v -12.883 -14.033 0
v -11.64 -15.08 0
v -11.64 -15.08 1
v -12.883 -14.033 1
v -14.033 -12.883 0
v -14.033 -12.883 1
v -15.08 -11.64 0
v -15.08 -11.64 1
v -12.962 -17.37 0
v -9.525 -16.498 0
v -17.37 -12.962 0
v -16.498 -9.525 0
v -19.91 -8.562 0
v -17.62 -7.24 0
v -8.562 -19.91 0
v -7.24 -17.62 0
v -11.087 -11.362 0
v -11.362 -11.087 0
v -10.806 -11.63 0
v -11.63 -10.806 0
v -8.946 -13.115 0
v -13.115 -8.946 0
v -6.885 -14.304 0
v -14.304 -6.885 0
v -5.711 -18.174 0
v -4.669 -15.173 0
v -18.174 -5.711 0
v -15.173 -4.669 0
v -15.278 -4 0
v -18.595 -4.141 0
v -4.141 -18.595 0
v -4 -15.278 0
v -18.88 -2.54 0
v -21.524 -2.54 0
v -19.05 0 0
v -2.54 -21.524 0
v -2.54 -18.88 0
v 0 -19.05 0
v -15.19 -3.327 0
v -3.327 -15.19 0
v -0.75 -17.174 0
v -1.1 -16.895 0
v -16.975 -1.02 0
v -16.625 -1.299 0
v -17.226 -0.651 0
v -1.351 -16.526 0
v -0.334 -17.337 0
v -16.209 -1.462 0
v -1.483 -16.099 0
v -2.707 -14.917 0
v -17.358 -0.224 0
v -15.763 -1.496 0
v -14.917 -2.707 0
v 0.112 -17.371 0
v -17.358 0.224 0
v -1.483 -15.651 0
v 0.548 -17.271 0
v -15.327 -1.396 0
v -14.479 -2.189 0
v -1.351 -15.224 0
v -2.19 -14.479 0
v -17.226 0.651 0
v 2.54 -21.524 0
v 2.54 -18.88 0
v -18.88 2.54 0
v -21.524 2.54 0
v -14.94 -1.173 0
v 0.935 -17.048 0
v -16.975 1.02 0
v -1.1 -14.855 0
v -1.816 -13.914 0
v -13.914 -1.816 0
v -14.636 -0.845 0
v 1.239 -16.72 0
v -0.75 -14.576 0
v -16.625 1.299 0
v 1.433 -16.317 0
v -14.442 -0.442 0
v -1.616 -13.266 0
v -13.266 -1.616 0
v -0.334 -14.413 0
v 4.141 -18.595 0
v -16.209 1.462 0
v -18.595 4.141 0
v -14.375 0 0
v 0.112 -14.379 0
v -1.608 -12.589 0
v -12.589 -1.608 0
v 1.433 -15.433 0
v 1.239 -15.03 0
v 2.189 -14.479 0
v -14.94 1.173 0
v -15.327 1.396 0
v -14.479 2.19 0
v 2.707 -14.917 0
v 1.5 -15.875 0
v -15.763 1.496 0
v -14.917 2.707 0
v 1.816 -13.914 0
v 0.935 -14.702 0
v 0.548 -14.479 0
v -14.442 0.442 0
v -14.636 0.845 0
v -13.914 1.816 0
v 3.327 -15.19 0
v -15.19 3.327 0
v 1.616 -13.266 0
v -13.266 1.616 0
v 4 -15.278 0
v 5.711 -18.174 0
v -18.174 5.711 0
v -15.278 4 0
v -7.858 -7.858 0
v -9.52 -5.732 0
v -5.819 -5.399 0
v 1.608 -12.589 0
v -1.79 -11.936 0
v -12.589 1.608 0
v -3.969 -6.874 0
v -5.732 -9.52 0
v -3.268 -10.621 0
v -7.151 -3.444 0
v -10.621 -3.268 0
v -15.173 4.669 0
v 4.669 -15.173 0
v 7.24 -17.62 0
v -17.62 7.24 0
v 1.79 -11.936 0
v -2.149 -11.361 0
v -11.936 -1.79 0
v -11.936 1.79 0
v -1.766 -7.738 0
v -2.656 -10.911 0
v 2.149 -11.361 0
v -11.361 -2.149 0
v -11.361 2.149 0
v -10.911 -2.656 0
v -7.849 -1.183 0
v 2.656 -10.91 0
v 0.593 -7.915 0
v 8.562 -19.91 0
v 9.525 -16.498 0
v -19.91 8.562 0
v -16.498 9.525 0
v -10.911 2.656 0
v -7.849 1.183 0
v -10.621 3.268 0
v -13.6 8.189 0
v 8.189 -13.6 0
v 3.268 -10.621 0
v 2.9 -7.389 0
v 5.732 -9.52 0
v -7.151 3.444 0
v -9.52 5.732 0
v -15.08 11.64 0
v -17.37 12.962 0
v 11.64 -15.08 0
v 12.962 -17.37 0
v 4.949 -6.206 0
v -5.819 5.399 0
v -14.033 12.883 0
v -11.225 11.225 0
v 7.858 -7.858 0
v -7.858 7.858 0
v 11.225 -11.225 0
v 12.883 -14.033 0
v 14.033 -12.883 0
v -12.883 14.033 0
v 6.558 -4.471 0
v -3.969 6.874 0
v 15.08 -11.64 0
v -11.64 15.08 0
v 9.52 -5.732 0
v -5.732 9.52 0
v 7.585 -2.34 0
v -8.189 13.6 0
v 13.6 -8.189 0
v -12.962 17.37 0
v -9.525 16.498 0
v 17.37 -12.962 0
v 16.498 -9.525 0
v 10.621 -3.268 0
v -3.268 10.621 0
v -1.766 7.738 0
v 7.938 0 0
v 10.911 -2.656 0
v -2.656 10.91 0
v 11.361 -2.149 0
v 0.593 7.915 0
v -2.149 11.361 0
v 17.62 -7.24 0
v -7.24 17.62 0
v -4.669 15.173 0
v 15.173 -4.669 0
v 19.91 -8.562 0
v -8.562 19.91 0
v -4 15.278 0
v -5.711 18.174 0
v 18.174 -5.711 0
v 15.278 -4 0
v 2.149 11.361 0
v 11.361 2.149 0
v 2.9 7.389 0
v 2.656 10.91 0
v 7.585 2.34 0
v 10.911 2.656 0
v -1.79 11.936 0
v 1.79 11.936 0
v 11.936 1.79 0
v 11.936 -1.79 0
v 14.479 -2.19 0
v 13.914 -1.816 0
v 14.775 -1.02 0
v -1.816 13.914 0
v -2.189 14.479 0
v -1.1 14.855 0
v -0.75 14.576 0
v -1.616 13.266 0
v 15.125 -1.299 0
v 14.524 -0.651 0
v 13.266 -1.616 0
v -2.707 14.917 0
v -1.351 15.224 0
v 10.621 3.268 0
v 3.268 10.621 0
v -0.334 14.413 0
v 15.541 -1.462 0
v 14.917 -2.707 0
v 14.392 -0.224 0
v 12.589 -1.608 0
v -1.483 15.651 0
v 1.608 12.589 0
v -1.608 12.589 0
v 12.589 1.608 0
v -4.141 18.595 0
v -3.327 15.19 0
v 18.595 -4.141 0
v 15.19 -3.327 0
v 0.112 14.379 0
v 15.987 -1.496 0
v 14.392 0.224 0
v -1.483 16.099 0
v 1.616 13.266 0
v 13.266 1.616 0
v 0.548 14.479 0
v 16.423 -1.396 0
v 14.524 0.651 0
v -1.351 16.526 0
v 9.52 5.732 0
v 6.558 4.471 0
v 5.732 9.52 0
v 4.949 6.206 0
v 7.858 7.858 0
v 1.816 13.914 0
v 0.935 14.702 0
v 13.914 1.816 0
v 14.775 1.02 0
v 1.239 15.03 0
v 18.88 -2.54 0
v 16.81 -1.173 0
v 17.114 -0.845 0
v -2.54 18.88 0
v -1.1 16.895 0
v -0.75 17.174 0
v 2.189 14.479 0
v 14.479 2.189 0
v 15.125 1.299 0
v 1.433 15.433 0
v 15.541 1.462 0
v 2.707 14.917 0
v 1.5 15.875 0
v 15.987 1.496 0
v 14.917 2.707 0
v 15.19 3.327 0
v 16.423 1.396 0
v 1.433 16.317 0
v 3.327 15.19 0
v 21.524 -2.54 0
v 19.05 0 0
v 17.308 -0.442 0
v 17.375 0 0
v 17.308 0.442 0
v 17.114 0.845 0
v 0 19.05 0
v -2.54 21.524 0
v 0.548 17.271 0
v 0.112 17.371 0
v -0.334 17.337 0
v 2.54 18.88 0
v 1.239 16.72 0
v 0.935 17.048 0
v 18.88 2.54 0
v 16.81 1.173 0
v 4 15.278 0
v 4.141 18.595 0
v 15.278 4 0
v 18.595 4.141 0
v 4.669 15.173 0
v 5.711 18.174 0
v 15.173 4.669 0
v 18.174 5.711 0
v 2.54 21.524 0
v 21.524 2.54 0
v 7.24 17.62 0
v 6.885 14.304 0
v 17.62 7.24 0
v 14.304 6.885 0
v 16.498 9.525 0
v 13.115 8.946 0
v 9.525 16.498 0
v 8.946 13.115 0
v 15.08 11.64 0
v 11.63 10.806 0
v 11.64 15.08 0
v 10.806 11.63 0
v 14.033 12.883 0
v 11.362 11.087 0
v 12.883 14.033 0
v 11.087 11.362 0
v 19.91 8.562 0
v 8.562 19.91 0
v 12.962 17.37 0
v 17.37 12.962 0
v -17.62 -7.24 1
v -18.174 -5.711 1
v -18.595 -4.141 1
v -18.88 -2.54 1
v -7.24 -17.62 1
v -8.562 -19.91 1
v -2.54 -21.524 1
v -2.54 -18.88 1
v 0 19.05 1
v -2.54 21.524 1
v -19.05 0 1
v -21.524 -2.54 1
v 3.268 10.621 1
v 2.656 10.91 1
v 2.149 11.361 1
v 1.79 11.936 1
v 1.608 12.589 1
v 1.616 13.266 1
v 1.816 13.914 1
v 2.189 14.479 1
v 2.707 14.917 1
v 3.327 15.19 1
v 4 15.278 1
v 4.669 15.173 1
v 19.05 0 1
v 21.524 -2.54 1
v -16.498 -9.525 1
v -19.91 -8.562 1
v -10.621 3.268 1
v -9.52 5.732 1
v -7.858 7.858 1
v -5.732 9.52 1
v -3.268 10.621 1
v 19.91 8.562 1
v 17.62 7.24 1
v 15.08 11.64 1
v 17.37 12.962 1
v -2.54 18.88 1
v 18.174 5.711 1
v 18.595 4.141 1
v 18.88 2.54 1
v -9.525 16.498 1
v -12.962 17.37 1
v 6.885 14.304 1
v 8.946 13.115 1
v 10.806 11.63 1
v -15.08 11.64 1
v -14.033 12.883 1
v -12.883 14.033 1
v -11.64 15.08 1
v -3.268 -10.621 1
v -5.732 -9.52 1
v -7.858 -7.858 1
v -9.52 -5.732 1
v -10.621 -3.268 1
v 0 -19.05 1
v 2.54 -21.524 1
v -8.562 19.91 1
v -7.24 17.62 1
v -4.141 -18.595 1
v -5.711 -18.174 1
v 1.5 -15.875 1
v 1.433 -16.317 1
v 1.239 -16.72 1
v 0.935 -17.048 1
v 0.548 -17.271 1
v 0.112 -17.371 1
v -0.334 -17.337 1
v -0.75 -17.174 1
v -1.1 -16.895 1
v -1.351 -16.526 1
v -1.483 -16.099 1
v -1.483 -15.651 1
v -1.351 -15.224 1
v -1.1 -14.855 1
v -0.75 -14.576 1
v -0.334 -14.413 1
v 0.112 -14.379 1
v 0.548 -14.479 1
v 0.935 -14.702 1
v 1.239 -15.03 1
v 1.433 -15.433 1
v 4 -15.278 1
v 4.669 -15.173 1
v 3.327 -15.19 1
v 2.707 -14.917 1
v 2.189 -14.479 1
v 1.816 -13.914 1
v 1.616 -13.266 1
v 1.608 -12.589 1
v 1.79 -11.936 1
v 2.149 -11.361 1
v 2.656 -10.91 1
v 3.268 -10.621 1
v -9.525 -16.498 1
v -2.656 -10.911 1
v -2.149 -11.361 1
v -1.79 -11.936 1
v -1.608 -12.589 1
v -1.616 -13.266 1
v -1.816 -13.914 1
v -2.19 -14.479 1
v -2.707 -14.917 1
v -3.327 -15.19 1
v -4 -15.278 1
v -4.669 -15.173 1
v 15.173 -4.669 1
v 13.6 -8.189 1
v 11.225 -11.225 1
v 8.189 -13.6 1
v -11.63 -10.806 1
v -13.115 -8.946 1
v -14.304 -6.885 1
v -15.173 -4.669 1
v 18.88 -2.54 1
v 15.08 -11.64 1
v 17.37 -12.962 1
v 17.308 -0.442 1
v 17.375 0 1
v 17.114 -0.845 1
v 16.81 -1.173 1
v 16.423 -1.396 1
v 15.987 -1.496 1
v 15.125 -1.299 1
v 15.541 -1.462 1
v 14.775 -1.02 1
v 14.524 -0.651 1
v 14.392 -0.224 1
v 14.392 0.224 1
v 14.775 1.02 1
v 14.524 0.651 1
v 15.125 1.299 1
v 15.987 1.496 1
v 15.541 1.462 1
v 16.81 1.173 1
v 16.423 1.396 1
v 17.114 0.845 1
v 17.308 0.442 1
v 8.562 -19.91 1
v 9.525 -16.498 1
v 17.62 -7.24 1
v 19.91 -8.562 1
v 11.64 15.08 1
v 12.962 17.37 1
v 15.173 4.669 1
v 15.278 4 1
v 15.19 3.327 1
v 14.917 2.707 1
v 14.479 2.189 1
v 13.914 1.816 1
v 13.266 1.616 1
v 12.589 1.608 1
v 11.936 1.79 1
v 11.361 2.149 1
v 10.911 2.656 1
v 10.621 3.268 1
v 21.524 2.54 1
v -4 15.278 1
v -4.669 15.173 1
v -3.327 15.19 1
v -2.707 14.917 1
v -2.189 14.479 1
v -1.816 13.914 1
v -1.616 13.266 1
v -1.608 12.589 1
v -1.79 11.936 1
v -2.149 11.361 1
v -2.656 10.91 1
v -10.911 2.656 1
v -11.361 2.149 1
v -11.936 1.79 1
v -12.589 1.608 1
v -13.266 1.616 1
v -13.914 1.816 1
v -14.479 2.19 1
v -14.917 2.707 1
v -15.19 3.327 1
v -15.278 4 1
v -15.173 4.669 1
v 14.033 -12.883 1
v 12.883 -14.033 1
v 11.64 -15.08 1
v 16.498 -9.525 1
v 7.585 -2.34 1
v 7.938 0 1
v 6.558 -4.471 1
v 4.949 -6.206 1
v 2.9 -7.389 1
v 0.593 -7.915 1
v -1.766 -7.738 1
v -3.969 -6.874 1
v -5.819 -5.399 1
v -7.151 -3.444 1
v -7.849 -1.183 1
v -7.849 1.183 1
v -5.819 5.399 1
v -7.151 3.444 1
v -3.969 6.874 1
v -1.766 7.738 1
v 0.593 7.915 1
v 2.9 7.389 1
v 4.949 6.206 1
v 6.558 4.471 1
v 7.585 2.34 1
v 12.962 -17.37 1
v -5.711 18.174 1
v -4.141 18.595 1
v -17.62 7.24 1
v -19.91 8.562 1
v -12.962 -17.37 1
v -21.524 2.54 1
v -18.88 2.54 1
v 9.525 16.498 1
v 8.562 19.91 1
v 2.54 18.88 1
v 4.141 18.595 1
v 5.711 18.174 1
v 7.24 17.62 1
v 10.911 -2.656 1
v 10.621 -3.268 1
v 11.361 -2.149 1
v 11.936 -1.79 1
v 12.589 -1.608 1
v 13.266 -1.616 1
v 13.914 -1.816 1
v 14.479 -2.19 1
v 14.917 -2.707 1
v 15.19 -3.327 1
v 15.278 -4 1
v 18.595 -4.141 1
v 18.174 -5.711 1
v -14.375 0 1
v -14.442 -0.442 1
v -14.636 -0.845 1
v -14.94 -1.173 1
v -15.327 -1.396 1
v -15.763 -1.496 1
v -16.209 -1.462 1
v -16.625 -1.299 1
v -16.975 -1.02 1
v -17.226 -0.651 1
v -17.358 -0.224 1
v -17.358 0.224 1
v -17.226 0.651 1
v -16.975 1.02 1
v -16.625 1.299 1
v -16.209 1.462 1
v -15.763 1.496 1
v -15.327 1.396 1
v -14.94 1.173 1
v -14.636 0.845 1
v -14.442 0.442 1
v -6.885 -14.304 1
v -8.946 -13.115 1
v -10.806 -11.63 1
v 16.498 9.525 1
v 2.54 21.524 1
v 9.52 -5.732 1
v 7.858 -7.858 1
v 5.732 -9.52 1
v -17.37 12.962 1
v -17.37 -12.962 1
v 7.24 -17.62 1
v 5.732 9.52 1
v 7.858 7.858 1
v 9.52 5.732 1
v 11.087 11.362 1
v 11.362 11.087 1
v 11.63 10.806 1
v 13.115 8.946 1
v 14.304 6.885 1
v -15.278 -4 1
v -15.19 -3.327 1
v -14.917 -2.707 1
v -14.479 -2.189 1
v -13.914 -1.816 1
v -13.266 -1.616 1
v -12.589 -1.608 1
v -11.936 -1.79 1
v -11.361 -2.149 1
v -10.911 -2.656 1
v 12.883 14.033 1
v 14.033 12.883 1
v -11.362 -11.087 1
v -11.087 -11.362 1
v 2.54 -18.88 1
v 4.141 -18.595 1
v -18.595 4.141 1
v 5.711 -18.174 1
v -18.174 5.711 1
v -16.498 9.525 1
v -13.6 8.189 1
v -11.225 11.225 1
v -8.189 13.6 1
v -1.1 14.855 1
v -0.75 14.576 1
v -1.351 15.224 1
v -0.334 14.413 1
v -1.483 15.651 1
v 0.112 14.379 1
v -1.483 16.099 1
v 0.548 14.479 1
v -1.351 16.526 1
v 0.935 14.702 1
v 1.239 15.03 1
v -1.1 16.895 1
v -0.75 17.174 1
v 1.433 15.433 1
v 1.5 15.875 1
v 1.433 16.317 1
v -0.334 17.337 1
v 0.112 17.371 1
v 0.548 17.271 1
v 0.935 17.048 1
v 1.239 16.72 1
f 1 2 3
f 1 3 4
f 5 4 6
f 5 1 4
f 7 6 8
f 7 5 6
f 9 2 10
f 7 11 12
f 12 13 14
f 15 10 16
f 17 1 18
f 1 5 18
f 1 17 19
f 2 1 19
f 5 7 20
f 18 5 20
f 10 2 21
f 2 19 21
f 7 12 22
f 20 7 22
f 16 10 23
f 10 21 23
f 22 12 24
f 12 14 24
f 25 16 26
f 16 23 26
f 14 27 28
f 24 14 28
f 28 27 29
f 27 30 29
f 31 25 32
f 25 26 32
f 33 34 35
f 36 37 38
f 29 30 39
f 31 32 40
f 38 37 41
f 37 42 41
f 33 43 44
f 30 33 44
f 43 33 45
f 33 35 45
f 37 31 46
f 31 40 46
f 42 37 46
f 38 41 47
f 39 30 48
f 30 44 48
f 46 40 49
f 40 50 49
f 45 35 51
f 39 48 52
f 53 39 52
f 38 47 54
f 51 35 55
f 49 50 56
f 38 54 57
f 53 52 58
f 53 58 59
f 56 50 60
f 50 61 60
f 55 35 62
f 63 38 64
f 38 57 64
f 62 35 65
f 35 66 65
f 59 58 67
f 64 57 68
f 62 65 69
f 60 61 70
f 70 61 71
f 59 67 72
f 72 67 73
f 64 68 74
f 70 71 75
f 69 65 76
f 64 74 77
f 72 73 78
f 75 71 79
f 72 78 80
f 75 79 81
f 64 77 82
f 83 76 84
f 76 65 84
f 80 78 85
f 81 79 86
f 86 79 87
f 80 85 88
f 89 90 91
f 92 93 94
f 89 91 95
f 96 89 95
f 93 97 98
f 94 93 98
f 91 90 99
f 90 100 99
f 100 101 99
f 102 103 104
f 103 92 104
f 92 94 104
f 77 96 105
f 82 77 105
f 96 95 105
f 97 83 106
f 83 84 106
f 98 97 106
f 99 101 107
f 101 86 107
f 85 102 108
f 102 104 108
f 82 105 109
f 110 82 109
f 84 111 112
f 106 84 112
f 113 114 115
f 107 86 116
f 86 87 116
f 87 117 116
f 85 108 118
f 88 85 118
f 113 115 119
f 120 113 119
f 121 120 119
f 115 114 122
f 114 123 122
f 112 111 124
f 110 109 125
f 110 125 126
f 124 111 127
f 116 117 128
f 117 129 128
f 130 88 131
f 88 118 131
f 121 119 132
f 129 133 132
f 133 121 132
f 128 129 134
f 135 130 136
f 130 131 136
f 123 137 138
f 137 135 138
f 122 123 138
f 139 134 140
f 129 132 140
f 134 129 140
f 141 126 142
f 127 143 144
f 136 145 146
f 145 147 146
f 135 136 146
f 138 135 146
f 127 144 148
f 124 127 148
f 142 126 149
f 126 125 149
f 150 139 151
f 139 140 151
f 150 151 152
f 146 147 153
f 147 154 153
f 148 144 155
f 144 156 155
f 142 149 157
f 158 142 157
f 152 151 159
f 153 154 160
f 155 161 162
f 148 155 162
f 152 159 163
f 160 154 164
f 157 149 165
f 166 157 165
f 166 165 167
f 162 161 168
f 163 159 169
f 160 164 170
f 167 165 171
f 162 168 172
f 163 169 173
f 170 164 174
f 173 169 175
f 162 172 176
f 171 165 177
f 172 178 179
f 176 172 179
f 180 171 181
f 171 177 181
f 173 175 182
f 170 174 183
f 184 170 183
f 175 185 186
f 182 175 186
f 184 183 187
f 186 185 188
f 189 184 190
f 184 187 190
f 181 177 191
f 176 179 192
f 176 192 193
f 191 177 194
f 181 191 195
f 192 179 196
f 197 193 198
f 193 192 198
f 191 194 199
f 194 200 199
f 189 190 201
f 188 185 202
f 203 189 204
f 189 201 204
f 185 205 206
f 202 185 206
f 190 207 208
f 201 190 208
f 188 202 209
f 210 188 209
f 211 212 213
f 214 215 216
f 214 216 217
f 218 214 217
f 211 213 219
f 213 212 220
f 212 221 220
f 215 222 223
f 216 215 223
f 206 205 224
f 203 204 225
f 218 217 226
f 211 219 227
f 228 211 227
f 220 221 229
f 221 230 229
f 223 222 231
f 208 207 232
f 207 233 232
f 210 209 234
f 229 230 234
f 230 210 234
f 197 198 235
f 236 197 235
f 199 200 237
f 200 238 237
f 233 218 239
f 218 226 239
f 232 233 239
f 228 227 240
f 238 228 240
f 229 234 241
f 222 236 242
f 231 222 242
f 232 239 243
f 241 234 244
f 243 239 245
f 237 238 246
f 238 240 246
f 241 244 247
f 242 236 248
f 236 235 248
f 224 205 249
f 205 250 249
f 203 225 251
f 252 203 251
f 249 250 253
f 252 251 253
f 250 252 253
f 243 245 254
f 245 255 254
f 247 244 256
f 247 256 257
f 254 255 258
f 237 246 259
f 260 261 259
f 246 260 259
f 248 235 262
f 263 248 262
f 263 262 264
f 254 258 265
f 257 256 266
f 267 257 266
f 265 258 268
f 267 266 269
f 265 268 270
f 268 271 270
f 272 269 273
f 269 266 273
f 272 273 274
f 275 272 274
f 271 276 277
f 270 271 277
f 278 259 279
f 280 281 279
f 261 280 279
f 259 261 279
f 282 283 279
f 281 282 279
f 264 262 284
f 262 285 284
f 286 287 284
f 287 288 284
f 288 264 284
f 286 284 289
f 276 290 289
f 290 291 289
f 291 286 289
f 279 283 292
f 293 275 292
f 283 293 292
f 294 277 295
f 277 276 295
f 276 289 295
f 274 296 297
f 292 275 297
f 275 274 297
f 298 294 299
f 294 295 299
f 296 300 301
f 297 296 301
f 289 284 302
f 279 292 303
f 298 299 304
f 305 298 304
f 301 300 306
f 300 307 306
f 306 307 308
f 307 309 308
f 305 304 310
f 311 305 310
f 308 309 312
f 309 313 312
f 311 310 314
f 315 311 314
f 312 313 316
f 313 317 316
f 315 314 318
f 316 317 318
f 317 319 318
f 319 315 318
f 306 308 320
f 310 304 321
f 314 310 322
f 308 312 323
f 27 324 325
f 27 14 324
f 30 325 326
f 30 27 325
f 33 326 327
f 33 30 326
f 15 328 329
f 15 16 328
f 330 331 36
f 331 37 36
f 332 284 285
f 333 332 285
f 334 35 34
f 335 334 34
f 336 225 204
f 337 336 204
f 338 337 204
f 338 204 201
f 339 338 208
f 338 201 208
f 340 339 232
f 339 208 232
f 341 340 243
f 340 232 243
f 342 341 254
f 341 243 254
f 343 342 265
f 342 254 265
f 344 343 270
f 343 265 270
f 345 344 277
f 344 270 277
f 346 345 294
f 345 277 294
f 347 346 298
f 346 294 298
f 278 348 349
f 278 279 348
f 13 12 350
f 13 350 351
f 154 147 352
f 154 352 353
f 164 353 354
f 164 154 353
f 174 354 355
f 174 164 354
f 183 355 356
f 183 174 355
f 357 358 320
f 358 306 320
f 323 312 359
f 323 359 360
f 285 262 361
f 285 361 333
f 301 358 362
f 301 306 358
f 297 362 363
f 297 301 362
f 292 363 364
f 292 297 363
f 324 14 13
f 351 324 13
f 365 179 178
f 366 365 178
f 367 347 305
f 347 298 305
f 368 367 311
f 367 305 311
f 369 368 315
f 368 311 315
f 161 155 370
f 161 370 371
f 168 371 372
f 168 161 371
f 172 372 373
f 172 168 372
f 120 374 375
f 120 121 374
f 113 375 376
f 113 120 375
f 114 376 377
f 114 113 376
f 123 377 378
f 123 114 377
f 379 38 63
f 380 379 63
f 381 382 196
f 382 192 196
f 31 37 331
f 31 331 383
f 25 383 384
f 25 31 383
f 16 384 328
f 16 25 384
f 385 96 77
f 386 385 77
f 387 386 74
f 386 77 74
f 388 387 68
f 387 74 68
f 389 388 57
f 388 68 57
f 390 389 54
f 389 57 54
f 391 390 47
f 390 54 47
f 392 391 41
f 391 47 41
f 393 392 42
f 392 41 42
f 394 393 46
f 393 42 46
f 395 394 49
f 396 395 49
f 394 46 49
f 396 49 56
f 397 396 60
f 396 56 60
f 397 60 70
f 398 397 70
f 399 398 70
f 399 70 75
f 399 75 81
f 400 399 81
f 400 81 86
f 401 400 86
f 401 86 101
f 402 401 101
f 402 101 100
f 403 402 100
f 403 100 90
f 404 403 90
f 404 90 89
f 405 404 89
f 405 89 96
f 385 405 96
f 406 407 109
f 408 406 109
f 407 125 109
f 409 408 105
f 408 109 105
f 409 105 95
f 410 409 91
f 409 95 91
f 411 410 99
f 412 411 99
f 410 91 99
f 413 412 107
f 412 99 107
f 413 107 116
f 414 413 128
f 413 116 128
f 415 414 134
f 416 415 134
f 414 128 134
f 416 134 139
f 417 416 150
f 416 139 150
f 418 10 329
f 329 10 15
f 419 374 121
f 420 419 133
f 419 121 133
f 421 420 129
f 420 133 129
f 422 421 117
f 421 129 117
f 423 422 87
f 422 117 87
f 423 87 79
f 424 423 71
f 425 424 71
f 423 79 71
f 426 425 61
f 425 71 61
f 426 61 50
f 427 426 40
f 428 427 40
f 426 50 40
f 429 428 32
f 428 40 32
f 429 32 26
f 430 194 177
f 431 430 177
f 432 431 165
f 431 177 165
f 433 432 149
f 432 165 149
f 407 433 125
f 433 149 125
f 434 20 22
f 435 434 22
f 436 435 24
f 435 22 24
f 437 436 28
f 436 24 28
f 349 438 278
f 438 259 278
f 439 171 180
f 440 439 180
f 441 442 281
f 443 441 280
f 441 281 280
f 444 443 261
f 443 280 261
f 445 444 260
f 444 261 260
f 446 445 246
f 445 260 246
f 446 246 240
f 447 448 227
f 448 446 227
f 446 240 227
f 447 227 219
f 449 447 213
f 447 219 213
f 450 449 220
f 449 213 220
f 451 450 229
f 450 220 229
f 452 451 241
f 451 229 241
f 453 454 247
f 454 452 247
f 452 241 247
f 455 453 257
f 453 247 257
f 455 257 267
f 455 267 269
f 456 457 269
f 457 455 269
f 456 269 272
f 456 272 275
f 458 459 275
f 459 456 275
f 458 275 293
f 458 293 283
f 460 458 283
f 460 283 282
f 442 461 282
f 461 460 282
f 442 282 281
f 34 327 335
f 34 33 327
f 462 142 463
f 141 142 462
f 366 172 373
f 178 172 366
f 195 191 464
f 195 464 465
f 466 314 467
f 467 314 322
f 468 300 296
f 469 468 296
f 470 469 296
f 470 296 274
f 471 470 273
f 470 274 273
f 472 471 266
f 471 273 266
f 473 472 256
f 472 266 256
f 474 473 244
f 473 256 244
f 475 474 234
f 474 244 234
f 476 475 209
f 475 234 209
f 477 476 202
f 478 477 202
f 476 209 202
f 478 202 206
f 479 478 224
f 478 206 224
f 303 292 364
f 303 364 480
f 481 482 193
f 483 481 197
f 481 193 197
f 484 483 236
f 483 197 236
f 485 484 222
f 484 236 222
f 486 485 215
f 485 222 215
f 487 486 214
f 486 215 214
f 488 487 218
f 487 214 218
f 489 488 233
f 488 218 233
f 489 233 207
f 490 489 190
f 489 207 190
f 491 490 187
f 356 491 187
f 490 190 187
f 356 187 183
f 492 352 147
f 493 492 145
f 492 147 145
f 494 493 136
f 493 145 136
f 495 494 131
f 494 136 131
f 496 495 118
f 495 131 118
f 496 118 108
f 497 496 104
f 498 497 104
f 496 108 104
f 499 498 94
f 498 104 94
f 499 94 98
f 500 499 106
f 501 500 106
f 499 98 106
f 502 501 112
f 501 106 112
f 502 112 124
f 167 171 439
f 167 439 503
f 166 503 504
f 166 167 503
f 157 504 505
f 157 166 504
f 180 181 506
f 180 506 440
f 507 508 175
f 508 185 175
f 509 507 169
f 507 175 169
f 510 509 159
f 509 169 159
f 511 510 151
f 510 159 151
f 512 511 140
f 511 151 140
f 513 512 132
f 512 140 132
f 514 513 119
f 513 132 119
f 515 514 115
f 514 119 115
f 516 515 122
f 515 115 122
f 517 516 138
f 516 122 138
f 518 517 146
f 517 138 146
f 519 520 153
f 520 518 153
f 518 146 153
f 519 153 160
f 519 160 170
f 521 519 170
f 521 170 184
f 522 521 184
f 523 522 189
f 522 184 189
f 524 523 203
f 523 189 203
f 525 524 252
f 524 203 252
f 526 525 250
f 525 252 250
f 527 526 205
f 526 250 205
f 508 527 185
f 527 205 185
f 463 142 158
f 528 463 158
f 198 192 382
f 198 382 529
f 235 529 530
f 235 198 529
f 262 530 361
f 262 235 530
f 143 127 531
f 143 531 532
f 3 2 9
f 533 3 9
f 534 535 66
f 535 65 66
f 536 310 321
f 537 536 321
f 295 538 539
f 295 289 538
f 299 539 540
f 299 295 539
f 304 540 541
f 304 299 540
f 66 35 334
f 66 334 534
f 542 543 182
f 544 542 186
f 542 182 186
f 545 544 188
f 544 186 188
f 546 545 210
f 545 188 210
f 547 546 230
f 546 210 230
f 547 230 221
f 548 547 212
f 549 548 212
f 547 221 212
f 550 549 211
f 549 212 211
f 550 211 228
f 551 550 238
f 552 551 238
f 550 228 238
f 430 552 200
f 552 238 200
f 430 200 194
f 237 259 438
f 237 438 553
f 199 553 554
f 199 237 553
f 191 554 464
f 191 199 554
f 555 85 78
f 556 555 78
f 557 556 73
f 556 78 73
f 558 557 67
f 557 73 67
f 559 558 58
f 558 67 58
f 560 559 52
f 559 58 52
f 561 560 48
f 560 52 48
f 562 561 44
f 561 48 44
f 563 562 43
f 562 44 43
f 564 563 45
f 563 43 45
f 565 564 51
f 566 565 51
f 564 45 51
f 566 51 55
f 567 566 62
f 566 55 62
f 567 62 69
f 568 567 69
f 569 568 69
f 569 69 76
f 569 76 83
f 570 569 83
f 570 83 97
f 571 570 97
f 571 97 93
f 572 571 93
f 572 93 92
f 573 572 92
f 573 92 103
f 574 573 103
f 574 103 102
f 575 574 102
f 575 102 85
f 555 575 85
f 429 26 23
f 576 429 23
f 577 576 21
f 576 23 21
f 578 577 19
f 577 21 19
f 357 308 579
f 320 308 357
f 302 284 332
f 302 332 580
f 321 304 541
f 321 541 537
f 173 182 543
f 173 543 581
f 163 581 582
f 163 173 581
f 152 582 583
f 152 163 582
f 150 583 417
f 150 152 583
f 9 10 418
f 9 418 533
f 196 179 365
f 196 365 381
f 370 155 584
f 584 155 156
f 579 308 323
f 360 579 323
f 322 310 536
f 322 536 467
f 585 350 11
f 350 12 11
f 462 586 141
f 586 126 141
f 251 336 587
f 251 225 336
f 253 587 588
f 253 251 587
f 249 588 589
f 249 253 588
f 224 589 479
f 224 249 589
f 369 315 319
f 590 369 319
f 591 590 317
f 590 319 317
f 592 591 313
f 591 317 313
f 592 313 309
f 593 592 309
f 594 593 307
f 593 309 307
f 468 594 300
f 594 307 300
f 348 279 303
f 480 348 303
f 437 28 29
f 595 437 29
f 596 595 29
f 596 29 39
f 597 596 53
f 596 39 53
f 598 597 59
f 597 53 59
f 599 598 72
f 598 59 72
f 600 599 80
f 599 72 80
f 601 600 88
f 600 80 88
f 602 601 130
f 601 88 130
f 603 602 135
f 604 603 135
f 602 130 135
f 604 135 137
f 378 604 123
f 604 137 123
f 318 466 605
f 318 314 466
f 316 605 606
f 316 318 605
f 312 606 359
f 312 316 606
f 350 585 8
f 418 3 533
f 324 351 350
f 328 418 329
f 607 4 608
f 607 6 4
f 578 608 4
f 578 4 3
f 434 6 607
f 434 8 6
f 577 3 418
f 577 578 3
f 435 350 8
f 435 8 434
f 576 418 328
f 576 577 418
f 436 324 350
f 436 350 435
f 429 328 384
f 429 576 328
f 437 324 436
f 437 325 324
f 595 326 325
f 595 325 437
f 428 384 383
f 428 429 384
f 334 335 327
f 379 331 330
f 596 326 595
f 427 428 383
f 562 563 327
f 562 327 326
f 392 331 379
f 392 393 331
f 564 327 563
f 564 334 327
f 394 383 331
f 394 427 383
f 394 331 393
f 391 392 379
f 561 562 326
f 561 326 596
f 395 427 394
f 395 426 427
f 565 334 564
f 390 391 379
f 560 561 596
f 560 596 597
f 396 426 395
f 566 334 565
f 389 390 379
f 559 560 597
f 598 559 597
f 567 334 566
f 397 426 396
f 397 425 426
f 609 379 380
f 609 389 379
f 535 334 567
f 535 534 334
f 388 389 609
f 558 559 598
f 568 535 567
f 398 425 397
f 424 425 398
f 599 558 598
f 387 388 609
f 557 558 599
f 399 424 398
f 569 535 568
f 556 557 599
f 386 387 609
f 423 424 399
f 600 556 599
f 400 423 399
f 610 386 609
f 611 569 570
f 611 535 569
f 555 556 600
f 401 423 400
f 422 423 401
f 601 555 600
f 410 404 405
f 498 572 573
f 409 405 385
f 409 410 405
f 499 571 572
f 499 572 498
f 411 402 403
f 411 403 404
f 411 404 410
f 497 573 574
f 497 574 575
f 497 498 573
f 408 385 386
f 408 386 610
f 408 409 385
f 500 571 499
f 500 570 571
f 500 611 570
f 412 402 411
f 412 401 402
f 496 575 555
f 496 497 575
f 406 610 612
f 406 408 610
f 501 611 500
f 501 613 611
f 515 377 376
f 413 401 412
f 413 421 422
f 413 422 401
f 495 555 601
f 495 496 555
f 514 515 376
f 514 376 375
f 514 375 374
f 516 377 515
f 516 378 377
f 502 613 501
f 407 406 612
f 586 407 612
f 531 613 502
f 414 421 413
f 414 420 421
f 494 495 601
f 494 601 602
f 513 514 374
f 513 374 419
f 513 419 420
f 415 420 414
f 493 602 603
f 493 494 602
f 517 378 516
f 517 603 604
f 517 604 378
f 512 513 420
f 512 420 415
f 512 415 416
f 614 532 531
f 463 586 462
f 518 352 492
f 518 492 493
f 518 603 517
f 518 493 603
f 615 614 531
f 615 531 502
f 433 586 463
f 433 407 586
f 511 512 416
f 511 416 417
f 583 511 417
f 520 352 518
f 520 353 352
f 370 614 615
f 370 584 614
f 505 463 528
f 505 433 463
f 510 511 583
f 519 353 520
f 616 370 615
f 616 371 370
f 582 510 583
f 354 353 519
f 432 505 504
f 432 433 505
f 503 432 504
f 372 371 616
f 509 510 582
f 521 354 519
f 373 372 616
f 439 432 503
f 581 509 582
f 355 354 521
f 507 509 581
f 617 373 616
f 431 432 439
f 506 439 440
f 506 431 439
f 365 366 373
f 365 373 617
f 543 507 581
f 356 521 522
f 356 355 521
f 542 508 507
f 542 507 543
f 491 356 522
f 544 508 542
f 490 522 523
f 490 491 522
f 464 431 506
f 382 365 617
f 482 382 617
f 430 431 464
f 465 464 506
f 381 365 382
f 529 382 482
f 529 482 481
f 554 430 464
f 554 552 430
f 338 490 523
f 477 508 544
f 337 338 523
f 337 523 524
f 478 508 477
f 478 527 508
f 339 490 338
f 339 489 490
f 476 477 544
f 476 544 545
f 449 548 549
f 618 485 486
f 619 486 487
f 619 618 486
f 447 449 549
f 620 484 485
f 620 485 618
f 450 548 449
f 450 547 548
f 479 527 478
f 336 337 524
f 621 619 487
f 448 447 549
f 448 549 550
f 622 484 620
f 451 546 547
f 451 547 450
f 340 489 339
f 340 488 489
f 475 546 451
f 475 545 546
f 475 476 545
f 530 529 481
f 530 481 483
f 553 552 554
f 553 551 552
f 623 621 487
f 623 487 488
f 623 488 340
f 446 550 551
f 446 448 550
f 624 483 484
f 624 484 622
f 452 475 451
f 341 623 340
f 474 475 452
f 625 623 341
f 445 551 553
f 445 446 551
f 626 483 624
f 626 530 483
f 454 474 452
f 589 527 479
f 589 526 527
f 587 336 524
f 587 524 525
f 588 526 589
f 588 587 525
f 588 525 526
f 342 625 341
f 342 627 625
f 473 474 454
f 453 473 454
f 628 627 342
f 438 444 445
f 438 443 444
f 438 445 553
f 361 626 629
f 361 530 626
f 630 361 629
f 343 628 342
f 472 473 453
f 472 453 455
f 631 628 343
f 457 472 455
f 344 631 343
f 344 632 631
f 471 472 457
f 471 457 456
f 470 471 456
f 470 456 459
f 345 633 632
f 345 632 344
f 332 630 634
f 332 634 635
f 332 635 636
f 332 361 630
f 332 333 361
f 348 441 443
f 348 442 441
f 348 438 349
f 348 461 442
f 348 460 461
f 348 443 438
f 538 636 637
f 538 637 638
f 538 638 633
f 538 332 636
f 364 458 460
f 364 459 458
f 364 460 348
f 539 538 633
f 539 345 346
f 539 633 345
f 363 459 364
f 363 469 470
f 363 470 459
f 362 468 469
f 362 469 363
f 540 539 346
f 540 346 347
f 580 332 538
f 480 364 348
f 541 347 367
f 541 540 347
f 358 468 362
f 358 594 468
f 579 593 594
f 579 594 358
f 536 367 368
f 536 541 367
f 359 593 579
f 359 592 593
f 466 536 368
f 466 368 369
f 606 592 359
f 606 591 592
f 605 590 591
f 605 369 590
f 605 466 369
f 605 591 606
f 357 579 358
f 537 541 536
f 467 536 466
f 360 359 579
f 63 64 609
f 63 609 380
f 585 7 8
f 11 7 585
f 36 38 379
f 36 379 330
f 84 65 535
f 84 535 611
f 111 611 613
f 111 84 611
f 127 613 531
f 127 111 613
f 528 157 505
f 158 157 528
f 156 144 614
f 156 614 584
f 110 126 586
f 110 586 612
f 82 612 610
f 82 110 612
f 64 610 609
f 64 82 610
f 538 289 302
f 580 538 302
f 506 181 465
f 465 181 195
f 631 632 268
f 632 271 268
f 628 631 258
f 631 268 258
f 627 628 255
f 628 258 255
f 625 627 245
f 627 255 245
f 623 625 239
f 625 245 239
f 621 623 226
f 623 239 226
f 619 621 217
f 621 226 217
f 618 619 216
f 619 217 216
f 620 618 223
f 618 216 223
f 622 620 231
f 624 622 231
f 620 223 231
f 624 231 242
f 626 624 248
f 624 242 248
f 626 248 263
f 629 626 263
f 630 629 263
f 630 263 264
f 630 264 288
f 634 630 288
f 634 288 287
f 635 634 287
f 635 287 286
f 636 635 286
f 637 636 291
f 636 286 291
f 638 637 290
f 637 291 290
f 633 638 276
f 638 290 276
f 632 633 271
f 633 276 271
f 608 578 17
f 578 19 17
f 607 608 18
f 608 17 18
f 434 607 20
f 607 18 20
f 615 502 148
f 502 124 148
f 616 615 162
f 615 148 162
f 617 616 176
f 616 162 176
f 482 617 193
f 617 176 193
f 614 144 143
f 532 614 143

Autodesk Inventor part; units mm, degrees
ref_plane "YZ Plane" through (0, 0, 0) normal (1, 0, 0) x (0, 1, 0)
ref_plane "XZ Plane" through (0, 0, 0) normal (0, 1, 0) x (-1, 0, 0)
ref_plane "XY Plane" through (0, 0, 0) normal (0, 0, 1) x (1, 0, 0)
sketch "Sketch1" plane through (0, 0, 0) normal (0, 0, 1) x (1, 0, 0)
  circle A0 centre (0, 0) radius 19.05
  circle A1 centre (0, 0) radius 15.875 construction
  circle A2 centre (0, 0) radius 11.1125
  line L0 (0, 0) -> (0, 19.05) construction
  circle A3 centre (0, 15.875) radius 1.5
  line L1 (-1.5875, 10.9985) -> (-1.5875, 18.9837)
  line L2 (1.5875, 10.9985) -> (1.5875, 18.9837)
  circle A4 centre (0, 0) radius 7.9375
  arc A5 (-4.6691, 15.1728) -> (-15.1728, 4.6691) centre (0, 0) ccw
  arc A6 (-15.4746, 3.5428) -> (-11.63, -10.8055) centre (0, 0) ccw
  arc A7 (-10.8055, -11.63) -> (3.5428, -15.4746) centre (0, 0) ccw
  arc A8 (4.6691, -15.1728) -> (15.1728, -4.6691) centre (0, 0) ccw
  arc A9 (15.4746, -3.5428) -> (11.63, 10.8055) centre (0, 0) ccw
  arc A10 (10.8055, 11.63) -> (-3.5428, 15.4746) centre (0, 0) ccw
  line L3 (-1.5875, 18.9837) -> (-1.5875, 21.5237) construction
  line L4 (-1.5875, 21.5237) -> (1.5875, 18.9837) construction
  arc A11 (-15.405, -3.8344) -> (-3.8344, -15.405) centre (0, 0) ccw
  arc A12 (4.6691, -15.1728) -> (15.1728, -4.6691) centre (0, 0) ccw
  arc A13 (15.3341, 4.1088) -> (4.6691, 15.1728) centre (0, 0) ccw
  arc A14 (-4.6691, 15.1728) -> (-15.1728, 4.6691) centre (0, 0) ccw
  line L5 (0, 19.05) -> (-2.54, 19.05) construction
  line L6 (-2.54, 19.05) -> (-2.54, 21.5237) construction
  line L7 (-2.54, 21.5237) -> (0, 21.5237) construction
  line L8 (0, 21.5237) -> (0, 19.05) construction
  line L9 (0, 19.05) -> (-2.54, 21.5237)
  line L10 (-2.54, 18.8799) -> (-2.54, 21.5237)
  line L11 (0, 19.05) -> (2.54, 21.5237)
  line L12 (2.54, 18.8799) -> (2.54, 21.5237)
  line L13 (-9.525, 16.4978) -> (-8.5622, 19.9101)
  line L14 (-7.2402, 17.6205) -> (-8.5622, 19.9101)
  line L15 (-9.525, 16.4978) -> (-12.9616, 17.3701)
  line L16 (-11.6397, 15.0805) -> (-12.9616, 17.3701)
  line L17 (-16.4978, 9.525) -> (-17.3701, 12.9616)
  line L18 (-15.0805, 11.6397) -> (-17.3701, 12.9616)
  line L19 (-16.4978, 9.525) -> (-19.9101, 8.5622)
  line L20 (-17.6205, 7.2402) -> (-19.9101, 8.5622)
  line L21 (-19.05, 0) -> (-21.5237, 2.54)
  line L22 (-18.8799, 2.54) -> (-21.5237, 2.54)
  line L23 (-19.05, 0) -> (-21.5237, -2.54)
  line L24 (-18.8799, -2.54) -> (-21.5237, -2.54)
  line L25 (-16.4978, -9.525) -> (-19.9101, -8.5622)
  line L26 (-17.6205, -7.2402) -> (-19.9101, -8.5622)
  line L27 (-16.4978, -9.525) -> (-17.3701, -12.9616)
  line L28 (-15.0805, -11.6397) -> (-17.3701, -12.9616)
  line L29 (-9.525, -16.4978) -> (-12.9616, -17.3701)
  line L30 (-11.6397, -15.0805) -> (-12.9616, -17.3701)
  line L31 (-9.525, -16.4978) -> (-8.5622, -19.9101)
  line L32 (-7.2402, -17.6205) -> (-8.5622, -19.9101)
  line L33 (0, -19.05) -> (-2.54, -21.5237)
  line L34 (-2.54, -18.8799) -> (-2.54, -21.5237)
  line L35 (0, -19.05) -> (2.54, -21.5237)
  line L36 (2.54, -18.8799) -> (2.54, -21.5237)
  line L37 (9.525, -16.4978) -> (8.5622, -19.9101)
  line L38 (7.2402, -17.6205) -> (8.5622, -19.9101)
  line L39 (9.525, -16.4978) -> (12.9616, -17.3701)
  line L40 (11.6397, -15.0805) -> (12.9616, -17.3701)
  line L41 (16.4978, -9.525) -> (17.3701, -12.9616)
  line L42 (15.0805, -11.6397) -> (17.3701, -12.9616)
  line L43 (16.4978, -9.525) -> (19.9101, -8.5622)
  line L44 (17.6205, -7.2402) -> (19.9101, -8.5622)
  line L45 (19.05, 0) -> (21.5237, -2.54)
  line L46 (18.8799, -2.54) -> (21.5237, -2.54)
  line L47 (19.05, 0) -> (21.5237, 2.54)
  line L48 (18.8799, 2.54) -> (21.5237, 2.54)
  line L49 (16.4978, 9.525) -> (19.9101, 8.5622)
  line L50 (17.6205, 7.2402) -> (19.9101, 8.5622)
  line L51 (16.4978, 9.525) -> (17.3701, 12.9616)
  line L52 (15.0805, 11.6397) -> (17.3701, 12.9616)
  line L53 (9.525, 16.4978) -> (12.9616, 17.3701)
  line L54 (11.6397, 15.0805) -> (12.9616, 17.3701)
  line L55 (9.525, 16.4978) -> (8.5622, 19.9101)
  line L56 (7.2402, 17.6205) -> (8.5622, 19.9101)
  arc A15 (4.6691, 15.1728) -> (3.2684, 10.621) centre (3.9687, 12.8969) ccw
  arc A16 (-3.2684, 10.621) -> (-4.6691, 15.1728) centre (-3.9687, 12.8969) ccw
  arc A17 (-15.1728, 4.6691) -> (-10.621, 3.2684) centre (-12.8969, 3.9688) ccw
  line L57 (-10.9985, 1.5875) -> (-18.9837, 1.5875)
  circle A18 centre (-15.875, 0) radius 1.5
  line L58 (-10.9985, -1.5875) -> (-18.9837, -1.5875)
  arc A19 (-10.621, -3.2684) -> (-15.1728, -4.6691) centre (-12.8969, -3.9688) ccw
  arc A20 (-4.6691, -15.1728) -> (-3.2684, -10.621) centre (-3.9688, -12.8969) ccw
  line L59 (-1.5875, -10.9985) -> (-1.5875, -18.9837)
  circle A21 centre (0, -15.875) radius 1.5
  line L60 (1.5875, -10.9985) -> (1.5875, -18.9837)
  arc A22 (3.2684, -10.621) -> (4.6691, -15.1728) centre (3.9687, -12.8969) ccw
  arc A23 (15.1728, -4.6691) -> (10.621, -3.2684) centre (12.8969, -3.9688) ccw
  line L61 (10.9985, -1.5875) -> (18.9837, -1.5875)
  circle A24 centre (15.875, 0) radius 1.5
  line L62 (10.9985, 1.5875) -> (18.9837, 1.5875)
  arc A25 (10.621, 3.2684) -> (15.1728, 4.6691) centre (12.8969, 3.9688) ccw
  point P0 (1.5875, 14.665)
  point P1 (4.5184, 10.1524)
  point P2 (10.8055, 11.63)
  point P3 (11.63, 10.8055)
  point P4 (-10.8055, -11.63)
  point P5 (-11.63, -10.8055)
  point P6 (-11.6397, 15.0805)
  point P7 (-9.525, 16.4978)
  point P8 (-9.525, 16.4978)
  point P9 (-7.2402, 17.6205)
  point P10 (-17.6205, 7.2402)
  point P11 (-16.4978, 9.525)
  point P12 (-16.4978, 9.525)
  point P13 (-15.0805, 11.6397)
  point P14 (-18.8799, -2.54)
  point P15 (-19.05, 0)
  point P16 (-19.05, 0)
  point P17 (-18.8799, 2.54)
  point P18 (-15.0805, -11.6397)
  point P19 (-16.4978, -9.525)
  point P20 (-16.4978, -9.525)
  point P21 (-17.6205, -7.2402)
  point P22 (-7.2402, -17.6205)
  point P23 (-9.525, -16.4978)
  point P24 (-9.525, -16.4978)
  point P25 (-11.6397, -15.0805)
  point P26 (2.54, -18.8799)
  point P27 (0, -19.05)
  point P28 (0, -19.05)
  point P29 (-2.54, -18.8799)
  point P30 (11.6397, -15.0805)
  point P31 (9.525, -16.4978)
  point P32 (9.525, -16.4978)
  point P33 (7.2402, -17.6205)
  point P34 (17.6205, -7.2402)
  point P35 (16.4978, -9.525)
  point P36 (16.4978, -9.525)
  point P37 (15.0805, -11.6397)
  point P38 (19.05, 0)
  point P39 (19.05, 0)
  point P40 (18.8799, -2.54)
  point P41 (18.8799, 2.54)
  point P42 (15.0805, 11.6397)
  point P43 (16.4978, 9.525)
  point P44 (16.4978, 9.525)
  point P45 (17.6205, 7.2402)
  point P46 (7.2402, 17.6205)
  point P47 (9.525, 16.4978)
  point P48 (9.525, 16.4978)
  point P49 (11.6397, 15.0805)
  point P50 (-14.665, 1.5875)
  point P51 (-1.5875, -14.665)
  point P52 (14.665, -1.5875)
  point P53 (3.2684, -10.621)
  point P54 (10.621, -3.2684)
  point P55 (15.1728, -4.6691)
  point P56 (4.6691, -15.1728)
  point P57 (-3.2684, -10.621)
  point P58 (-4.6691, -15.1728)
  point P59 (-15.1728, -4.6691)
  point P60 (-3.2684, 10.621)
  point P61 (-10.621, 3.2684)
  point P62 (-15.1728, 4.6691)
  point P63 (4.6691, 15.1728)
  point P64 (15.1728, 4.6691)
  point P65 (10.621, 3.2684)
  dimension "d0" = 38.1
  dimension "d1" = 31.75
  dimension "d2" = 22.225
  dimension "d3" = 3
  dimension "d4" = 1.5875
  dimension "d5" = 1.5875
  dimension "d10" = 15.875
  dimension "d13" = 360
  dimension "d15" = 2.54
  dimension "d22" = 2.54
  dimension "d25" = 360
  dimension "d29" = 360
extrude "Extrusion1" add sketch "Sketch1" along normal blind 1 contours A0 L61 A9 A24 L62 | L45 L46 A0 | A0 L48 L47 | L62 A9 A13 A10 L2 A0 | A0 L60 A22 A8 A23 L61 | L62 A25 A9 | A9 A24 L61 A2 L62 | A0 L49 L50 | L62 A2 A25 | L44 L43 A0 | A23 A2 L61 | A0 L52 L51 | A2 | L41 L42 A0 | A2 L2 A15 | A22 L60 A2 | A0 L53 L54 | A2 L1 A10 A3 L2 | L2 A10 A15 | L40 L39 A0 | L60 A7 A21 L59 A2 | A0 L56 L55 | A2 A16 L1 | A10 A3 L1 A0 L2 | L37 L38 A0 | L60 A0 L59 A7 A21 | L59 A20 A2 | A16 A5 A17 L57 A0 L1 | A0 L11 L12 | A0 L36 L35 | L59 A7 A20 | A2 L57 A17 | A0 L10 L9 | L33 L34 A0 | A19 L58 A2 | A7 L59 A0 L58 A6 A11 | A2 L58 A6 A18 L57 | A19 A6 L58 | A6 A18 L58 A0 L57 | A0 L21 L22 | A0 L13 L14 | L32 L31 A0 | A0 L24 L23 | A0 L16 L15 | L29 L30 A0 | L20 L19 A0 | A0 L25 L26 | L17 L18 A0 | L28 L27 A0
equation "\"OD\" = 38.1"
properties part number "Wood Magnets  (UNI) V1.0." material "Titanium"
